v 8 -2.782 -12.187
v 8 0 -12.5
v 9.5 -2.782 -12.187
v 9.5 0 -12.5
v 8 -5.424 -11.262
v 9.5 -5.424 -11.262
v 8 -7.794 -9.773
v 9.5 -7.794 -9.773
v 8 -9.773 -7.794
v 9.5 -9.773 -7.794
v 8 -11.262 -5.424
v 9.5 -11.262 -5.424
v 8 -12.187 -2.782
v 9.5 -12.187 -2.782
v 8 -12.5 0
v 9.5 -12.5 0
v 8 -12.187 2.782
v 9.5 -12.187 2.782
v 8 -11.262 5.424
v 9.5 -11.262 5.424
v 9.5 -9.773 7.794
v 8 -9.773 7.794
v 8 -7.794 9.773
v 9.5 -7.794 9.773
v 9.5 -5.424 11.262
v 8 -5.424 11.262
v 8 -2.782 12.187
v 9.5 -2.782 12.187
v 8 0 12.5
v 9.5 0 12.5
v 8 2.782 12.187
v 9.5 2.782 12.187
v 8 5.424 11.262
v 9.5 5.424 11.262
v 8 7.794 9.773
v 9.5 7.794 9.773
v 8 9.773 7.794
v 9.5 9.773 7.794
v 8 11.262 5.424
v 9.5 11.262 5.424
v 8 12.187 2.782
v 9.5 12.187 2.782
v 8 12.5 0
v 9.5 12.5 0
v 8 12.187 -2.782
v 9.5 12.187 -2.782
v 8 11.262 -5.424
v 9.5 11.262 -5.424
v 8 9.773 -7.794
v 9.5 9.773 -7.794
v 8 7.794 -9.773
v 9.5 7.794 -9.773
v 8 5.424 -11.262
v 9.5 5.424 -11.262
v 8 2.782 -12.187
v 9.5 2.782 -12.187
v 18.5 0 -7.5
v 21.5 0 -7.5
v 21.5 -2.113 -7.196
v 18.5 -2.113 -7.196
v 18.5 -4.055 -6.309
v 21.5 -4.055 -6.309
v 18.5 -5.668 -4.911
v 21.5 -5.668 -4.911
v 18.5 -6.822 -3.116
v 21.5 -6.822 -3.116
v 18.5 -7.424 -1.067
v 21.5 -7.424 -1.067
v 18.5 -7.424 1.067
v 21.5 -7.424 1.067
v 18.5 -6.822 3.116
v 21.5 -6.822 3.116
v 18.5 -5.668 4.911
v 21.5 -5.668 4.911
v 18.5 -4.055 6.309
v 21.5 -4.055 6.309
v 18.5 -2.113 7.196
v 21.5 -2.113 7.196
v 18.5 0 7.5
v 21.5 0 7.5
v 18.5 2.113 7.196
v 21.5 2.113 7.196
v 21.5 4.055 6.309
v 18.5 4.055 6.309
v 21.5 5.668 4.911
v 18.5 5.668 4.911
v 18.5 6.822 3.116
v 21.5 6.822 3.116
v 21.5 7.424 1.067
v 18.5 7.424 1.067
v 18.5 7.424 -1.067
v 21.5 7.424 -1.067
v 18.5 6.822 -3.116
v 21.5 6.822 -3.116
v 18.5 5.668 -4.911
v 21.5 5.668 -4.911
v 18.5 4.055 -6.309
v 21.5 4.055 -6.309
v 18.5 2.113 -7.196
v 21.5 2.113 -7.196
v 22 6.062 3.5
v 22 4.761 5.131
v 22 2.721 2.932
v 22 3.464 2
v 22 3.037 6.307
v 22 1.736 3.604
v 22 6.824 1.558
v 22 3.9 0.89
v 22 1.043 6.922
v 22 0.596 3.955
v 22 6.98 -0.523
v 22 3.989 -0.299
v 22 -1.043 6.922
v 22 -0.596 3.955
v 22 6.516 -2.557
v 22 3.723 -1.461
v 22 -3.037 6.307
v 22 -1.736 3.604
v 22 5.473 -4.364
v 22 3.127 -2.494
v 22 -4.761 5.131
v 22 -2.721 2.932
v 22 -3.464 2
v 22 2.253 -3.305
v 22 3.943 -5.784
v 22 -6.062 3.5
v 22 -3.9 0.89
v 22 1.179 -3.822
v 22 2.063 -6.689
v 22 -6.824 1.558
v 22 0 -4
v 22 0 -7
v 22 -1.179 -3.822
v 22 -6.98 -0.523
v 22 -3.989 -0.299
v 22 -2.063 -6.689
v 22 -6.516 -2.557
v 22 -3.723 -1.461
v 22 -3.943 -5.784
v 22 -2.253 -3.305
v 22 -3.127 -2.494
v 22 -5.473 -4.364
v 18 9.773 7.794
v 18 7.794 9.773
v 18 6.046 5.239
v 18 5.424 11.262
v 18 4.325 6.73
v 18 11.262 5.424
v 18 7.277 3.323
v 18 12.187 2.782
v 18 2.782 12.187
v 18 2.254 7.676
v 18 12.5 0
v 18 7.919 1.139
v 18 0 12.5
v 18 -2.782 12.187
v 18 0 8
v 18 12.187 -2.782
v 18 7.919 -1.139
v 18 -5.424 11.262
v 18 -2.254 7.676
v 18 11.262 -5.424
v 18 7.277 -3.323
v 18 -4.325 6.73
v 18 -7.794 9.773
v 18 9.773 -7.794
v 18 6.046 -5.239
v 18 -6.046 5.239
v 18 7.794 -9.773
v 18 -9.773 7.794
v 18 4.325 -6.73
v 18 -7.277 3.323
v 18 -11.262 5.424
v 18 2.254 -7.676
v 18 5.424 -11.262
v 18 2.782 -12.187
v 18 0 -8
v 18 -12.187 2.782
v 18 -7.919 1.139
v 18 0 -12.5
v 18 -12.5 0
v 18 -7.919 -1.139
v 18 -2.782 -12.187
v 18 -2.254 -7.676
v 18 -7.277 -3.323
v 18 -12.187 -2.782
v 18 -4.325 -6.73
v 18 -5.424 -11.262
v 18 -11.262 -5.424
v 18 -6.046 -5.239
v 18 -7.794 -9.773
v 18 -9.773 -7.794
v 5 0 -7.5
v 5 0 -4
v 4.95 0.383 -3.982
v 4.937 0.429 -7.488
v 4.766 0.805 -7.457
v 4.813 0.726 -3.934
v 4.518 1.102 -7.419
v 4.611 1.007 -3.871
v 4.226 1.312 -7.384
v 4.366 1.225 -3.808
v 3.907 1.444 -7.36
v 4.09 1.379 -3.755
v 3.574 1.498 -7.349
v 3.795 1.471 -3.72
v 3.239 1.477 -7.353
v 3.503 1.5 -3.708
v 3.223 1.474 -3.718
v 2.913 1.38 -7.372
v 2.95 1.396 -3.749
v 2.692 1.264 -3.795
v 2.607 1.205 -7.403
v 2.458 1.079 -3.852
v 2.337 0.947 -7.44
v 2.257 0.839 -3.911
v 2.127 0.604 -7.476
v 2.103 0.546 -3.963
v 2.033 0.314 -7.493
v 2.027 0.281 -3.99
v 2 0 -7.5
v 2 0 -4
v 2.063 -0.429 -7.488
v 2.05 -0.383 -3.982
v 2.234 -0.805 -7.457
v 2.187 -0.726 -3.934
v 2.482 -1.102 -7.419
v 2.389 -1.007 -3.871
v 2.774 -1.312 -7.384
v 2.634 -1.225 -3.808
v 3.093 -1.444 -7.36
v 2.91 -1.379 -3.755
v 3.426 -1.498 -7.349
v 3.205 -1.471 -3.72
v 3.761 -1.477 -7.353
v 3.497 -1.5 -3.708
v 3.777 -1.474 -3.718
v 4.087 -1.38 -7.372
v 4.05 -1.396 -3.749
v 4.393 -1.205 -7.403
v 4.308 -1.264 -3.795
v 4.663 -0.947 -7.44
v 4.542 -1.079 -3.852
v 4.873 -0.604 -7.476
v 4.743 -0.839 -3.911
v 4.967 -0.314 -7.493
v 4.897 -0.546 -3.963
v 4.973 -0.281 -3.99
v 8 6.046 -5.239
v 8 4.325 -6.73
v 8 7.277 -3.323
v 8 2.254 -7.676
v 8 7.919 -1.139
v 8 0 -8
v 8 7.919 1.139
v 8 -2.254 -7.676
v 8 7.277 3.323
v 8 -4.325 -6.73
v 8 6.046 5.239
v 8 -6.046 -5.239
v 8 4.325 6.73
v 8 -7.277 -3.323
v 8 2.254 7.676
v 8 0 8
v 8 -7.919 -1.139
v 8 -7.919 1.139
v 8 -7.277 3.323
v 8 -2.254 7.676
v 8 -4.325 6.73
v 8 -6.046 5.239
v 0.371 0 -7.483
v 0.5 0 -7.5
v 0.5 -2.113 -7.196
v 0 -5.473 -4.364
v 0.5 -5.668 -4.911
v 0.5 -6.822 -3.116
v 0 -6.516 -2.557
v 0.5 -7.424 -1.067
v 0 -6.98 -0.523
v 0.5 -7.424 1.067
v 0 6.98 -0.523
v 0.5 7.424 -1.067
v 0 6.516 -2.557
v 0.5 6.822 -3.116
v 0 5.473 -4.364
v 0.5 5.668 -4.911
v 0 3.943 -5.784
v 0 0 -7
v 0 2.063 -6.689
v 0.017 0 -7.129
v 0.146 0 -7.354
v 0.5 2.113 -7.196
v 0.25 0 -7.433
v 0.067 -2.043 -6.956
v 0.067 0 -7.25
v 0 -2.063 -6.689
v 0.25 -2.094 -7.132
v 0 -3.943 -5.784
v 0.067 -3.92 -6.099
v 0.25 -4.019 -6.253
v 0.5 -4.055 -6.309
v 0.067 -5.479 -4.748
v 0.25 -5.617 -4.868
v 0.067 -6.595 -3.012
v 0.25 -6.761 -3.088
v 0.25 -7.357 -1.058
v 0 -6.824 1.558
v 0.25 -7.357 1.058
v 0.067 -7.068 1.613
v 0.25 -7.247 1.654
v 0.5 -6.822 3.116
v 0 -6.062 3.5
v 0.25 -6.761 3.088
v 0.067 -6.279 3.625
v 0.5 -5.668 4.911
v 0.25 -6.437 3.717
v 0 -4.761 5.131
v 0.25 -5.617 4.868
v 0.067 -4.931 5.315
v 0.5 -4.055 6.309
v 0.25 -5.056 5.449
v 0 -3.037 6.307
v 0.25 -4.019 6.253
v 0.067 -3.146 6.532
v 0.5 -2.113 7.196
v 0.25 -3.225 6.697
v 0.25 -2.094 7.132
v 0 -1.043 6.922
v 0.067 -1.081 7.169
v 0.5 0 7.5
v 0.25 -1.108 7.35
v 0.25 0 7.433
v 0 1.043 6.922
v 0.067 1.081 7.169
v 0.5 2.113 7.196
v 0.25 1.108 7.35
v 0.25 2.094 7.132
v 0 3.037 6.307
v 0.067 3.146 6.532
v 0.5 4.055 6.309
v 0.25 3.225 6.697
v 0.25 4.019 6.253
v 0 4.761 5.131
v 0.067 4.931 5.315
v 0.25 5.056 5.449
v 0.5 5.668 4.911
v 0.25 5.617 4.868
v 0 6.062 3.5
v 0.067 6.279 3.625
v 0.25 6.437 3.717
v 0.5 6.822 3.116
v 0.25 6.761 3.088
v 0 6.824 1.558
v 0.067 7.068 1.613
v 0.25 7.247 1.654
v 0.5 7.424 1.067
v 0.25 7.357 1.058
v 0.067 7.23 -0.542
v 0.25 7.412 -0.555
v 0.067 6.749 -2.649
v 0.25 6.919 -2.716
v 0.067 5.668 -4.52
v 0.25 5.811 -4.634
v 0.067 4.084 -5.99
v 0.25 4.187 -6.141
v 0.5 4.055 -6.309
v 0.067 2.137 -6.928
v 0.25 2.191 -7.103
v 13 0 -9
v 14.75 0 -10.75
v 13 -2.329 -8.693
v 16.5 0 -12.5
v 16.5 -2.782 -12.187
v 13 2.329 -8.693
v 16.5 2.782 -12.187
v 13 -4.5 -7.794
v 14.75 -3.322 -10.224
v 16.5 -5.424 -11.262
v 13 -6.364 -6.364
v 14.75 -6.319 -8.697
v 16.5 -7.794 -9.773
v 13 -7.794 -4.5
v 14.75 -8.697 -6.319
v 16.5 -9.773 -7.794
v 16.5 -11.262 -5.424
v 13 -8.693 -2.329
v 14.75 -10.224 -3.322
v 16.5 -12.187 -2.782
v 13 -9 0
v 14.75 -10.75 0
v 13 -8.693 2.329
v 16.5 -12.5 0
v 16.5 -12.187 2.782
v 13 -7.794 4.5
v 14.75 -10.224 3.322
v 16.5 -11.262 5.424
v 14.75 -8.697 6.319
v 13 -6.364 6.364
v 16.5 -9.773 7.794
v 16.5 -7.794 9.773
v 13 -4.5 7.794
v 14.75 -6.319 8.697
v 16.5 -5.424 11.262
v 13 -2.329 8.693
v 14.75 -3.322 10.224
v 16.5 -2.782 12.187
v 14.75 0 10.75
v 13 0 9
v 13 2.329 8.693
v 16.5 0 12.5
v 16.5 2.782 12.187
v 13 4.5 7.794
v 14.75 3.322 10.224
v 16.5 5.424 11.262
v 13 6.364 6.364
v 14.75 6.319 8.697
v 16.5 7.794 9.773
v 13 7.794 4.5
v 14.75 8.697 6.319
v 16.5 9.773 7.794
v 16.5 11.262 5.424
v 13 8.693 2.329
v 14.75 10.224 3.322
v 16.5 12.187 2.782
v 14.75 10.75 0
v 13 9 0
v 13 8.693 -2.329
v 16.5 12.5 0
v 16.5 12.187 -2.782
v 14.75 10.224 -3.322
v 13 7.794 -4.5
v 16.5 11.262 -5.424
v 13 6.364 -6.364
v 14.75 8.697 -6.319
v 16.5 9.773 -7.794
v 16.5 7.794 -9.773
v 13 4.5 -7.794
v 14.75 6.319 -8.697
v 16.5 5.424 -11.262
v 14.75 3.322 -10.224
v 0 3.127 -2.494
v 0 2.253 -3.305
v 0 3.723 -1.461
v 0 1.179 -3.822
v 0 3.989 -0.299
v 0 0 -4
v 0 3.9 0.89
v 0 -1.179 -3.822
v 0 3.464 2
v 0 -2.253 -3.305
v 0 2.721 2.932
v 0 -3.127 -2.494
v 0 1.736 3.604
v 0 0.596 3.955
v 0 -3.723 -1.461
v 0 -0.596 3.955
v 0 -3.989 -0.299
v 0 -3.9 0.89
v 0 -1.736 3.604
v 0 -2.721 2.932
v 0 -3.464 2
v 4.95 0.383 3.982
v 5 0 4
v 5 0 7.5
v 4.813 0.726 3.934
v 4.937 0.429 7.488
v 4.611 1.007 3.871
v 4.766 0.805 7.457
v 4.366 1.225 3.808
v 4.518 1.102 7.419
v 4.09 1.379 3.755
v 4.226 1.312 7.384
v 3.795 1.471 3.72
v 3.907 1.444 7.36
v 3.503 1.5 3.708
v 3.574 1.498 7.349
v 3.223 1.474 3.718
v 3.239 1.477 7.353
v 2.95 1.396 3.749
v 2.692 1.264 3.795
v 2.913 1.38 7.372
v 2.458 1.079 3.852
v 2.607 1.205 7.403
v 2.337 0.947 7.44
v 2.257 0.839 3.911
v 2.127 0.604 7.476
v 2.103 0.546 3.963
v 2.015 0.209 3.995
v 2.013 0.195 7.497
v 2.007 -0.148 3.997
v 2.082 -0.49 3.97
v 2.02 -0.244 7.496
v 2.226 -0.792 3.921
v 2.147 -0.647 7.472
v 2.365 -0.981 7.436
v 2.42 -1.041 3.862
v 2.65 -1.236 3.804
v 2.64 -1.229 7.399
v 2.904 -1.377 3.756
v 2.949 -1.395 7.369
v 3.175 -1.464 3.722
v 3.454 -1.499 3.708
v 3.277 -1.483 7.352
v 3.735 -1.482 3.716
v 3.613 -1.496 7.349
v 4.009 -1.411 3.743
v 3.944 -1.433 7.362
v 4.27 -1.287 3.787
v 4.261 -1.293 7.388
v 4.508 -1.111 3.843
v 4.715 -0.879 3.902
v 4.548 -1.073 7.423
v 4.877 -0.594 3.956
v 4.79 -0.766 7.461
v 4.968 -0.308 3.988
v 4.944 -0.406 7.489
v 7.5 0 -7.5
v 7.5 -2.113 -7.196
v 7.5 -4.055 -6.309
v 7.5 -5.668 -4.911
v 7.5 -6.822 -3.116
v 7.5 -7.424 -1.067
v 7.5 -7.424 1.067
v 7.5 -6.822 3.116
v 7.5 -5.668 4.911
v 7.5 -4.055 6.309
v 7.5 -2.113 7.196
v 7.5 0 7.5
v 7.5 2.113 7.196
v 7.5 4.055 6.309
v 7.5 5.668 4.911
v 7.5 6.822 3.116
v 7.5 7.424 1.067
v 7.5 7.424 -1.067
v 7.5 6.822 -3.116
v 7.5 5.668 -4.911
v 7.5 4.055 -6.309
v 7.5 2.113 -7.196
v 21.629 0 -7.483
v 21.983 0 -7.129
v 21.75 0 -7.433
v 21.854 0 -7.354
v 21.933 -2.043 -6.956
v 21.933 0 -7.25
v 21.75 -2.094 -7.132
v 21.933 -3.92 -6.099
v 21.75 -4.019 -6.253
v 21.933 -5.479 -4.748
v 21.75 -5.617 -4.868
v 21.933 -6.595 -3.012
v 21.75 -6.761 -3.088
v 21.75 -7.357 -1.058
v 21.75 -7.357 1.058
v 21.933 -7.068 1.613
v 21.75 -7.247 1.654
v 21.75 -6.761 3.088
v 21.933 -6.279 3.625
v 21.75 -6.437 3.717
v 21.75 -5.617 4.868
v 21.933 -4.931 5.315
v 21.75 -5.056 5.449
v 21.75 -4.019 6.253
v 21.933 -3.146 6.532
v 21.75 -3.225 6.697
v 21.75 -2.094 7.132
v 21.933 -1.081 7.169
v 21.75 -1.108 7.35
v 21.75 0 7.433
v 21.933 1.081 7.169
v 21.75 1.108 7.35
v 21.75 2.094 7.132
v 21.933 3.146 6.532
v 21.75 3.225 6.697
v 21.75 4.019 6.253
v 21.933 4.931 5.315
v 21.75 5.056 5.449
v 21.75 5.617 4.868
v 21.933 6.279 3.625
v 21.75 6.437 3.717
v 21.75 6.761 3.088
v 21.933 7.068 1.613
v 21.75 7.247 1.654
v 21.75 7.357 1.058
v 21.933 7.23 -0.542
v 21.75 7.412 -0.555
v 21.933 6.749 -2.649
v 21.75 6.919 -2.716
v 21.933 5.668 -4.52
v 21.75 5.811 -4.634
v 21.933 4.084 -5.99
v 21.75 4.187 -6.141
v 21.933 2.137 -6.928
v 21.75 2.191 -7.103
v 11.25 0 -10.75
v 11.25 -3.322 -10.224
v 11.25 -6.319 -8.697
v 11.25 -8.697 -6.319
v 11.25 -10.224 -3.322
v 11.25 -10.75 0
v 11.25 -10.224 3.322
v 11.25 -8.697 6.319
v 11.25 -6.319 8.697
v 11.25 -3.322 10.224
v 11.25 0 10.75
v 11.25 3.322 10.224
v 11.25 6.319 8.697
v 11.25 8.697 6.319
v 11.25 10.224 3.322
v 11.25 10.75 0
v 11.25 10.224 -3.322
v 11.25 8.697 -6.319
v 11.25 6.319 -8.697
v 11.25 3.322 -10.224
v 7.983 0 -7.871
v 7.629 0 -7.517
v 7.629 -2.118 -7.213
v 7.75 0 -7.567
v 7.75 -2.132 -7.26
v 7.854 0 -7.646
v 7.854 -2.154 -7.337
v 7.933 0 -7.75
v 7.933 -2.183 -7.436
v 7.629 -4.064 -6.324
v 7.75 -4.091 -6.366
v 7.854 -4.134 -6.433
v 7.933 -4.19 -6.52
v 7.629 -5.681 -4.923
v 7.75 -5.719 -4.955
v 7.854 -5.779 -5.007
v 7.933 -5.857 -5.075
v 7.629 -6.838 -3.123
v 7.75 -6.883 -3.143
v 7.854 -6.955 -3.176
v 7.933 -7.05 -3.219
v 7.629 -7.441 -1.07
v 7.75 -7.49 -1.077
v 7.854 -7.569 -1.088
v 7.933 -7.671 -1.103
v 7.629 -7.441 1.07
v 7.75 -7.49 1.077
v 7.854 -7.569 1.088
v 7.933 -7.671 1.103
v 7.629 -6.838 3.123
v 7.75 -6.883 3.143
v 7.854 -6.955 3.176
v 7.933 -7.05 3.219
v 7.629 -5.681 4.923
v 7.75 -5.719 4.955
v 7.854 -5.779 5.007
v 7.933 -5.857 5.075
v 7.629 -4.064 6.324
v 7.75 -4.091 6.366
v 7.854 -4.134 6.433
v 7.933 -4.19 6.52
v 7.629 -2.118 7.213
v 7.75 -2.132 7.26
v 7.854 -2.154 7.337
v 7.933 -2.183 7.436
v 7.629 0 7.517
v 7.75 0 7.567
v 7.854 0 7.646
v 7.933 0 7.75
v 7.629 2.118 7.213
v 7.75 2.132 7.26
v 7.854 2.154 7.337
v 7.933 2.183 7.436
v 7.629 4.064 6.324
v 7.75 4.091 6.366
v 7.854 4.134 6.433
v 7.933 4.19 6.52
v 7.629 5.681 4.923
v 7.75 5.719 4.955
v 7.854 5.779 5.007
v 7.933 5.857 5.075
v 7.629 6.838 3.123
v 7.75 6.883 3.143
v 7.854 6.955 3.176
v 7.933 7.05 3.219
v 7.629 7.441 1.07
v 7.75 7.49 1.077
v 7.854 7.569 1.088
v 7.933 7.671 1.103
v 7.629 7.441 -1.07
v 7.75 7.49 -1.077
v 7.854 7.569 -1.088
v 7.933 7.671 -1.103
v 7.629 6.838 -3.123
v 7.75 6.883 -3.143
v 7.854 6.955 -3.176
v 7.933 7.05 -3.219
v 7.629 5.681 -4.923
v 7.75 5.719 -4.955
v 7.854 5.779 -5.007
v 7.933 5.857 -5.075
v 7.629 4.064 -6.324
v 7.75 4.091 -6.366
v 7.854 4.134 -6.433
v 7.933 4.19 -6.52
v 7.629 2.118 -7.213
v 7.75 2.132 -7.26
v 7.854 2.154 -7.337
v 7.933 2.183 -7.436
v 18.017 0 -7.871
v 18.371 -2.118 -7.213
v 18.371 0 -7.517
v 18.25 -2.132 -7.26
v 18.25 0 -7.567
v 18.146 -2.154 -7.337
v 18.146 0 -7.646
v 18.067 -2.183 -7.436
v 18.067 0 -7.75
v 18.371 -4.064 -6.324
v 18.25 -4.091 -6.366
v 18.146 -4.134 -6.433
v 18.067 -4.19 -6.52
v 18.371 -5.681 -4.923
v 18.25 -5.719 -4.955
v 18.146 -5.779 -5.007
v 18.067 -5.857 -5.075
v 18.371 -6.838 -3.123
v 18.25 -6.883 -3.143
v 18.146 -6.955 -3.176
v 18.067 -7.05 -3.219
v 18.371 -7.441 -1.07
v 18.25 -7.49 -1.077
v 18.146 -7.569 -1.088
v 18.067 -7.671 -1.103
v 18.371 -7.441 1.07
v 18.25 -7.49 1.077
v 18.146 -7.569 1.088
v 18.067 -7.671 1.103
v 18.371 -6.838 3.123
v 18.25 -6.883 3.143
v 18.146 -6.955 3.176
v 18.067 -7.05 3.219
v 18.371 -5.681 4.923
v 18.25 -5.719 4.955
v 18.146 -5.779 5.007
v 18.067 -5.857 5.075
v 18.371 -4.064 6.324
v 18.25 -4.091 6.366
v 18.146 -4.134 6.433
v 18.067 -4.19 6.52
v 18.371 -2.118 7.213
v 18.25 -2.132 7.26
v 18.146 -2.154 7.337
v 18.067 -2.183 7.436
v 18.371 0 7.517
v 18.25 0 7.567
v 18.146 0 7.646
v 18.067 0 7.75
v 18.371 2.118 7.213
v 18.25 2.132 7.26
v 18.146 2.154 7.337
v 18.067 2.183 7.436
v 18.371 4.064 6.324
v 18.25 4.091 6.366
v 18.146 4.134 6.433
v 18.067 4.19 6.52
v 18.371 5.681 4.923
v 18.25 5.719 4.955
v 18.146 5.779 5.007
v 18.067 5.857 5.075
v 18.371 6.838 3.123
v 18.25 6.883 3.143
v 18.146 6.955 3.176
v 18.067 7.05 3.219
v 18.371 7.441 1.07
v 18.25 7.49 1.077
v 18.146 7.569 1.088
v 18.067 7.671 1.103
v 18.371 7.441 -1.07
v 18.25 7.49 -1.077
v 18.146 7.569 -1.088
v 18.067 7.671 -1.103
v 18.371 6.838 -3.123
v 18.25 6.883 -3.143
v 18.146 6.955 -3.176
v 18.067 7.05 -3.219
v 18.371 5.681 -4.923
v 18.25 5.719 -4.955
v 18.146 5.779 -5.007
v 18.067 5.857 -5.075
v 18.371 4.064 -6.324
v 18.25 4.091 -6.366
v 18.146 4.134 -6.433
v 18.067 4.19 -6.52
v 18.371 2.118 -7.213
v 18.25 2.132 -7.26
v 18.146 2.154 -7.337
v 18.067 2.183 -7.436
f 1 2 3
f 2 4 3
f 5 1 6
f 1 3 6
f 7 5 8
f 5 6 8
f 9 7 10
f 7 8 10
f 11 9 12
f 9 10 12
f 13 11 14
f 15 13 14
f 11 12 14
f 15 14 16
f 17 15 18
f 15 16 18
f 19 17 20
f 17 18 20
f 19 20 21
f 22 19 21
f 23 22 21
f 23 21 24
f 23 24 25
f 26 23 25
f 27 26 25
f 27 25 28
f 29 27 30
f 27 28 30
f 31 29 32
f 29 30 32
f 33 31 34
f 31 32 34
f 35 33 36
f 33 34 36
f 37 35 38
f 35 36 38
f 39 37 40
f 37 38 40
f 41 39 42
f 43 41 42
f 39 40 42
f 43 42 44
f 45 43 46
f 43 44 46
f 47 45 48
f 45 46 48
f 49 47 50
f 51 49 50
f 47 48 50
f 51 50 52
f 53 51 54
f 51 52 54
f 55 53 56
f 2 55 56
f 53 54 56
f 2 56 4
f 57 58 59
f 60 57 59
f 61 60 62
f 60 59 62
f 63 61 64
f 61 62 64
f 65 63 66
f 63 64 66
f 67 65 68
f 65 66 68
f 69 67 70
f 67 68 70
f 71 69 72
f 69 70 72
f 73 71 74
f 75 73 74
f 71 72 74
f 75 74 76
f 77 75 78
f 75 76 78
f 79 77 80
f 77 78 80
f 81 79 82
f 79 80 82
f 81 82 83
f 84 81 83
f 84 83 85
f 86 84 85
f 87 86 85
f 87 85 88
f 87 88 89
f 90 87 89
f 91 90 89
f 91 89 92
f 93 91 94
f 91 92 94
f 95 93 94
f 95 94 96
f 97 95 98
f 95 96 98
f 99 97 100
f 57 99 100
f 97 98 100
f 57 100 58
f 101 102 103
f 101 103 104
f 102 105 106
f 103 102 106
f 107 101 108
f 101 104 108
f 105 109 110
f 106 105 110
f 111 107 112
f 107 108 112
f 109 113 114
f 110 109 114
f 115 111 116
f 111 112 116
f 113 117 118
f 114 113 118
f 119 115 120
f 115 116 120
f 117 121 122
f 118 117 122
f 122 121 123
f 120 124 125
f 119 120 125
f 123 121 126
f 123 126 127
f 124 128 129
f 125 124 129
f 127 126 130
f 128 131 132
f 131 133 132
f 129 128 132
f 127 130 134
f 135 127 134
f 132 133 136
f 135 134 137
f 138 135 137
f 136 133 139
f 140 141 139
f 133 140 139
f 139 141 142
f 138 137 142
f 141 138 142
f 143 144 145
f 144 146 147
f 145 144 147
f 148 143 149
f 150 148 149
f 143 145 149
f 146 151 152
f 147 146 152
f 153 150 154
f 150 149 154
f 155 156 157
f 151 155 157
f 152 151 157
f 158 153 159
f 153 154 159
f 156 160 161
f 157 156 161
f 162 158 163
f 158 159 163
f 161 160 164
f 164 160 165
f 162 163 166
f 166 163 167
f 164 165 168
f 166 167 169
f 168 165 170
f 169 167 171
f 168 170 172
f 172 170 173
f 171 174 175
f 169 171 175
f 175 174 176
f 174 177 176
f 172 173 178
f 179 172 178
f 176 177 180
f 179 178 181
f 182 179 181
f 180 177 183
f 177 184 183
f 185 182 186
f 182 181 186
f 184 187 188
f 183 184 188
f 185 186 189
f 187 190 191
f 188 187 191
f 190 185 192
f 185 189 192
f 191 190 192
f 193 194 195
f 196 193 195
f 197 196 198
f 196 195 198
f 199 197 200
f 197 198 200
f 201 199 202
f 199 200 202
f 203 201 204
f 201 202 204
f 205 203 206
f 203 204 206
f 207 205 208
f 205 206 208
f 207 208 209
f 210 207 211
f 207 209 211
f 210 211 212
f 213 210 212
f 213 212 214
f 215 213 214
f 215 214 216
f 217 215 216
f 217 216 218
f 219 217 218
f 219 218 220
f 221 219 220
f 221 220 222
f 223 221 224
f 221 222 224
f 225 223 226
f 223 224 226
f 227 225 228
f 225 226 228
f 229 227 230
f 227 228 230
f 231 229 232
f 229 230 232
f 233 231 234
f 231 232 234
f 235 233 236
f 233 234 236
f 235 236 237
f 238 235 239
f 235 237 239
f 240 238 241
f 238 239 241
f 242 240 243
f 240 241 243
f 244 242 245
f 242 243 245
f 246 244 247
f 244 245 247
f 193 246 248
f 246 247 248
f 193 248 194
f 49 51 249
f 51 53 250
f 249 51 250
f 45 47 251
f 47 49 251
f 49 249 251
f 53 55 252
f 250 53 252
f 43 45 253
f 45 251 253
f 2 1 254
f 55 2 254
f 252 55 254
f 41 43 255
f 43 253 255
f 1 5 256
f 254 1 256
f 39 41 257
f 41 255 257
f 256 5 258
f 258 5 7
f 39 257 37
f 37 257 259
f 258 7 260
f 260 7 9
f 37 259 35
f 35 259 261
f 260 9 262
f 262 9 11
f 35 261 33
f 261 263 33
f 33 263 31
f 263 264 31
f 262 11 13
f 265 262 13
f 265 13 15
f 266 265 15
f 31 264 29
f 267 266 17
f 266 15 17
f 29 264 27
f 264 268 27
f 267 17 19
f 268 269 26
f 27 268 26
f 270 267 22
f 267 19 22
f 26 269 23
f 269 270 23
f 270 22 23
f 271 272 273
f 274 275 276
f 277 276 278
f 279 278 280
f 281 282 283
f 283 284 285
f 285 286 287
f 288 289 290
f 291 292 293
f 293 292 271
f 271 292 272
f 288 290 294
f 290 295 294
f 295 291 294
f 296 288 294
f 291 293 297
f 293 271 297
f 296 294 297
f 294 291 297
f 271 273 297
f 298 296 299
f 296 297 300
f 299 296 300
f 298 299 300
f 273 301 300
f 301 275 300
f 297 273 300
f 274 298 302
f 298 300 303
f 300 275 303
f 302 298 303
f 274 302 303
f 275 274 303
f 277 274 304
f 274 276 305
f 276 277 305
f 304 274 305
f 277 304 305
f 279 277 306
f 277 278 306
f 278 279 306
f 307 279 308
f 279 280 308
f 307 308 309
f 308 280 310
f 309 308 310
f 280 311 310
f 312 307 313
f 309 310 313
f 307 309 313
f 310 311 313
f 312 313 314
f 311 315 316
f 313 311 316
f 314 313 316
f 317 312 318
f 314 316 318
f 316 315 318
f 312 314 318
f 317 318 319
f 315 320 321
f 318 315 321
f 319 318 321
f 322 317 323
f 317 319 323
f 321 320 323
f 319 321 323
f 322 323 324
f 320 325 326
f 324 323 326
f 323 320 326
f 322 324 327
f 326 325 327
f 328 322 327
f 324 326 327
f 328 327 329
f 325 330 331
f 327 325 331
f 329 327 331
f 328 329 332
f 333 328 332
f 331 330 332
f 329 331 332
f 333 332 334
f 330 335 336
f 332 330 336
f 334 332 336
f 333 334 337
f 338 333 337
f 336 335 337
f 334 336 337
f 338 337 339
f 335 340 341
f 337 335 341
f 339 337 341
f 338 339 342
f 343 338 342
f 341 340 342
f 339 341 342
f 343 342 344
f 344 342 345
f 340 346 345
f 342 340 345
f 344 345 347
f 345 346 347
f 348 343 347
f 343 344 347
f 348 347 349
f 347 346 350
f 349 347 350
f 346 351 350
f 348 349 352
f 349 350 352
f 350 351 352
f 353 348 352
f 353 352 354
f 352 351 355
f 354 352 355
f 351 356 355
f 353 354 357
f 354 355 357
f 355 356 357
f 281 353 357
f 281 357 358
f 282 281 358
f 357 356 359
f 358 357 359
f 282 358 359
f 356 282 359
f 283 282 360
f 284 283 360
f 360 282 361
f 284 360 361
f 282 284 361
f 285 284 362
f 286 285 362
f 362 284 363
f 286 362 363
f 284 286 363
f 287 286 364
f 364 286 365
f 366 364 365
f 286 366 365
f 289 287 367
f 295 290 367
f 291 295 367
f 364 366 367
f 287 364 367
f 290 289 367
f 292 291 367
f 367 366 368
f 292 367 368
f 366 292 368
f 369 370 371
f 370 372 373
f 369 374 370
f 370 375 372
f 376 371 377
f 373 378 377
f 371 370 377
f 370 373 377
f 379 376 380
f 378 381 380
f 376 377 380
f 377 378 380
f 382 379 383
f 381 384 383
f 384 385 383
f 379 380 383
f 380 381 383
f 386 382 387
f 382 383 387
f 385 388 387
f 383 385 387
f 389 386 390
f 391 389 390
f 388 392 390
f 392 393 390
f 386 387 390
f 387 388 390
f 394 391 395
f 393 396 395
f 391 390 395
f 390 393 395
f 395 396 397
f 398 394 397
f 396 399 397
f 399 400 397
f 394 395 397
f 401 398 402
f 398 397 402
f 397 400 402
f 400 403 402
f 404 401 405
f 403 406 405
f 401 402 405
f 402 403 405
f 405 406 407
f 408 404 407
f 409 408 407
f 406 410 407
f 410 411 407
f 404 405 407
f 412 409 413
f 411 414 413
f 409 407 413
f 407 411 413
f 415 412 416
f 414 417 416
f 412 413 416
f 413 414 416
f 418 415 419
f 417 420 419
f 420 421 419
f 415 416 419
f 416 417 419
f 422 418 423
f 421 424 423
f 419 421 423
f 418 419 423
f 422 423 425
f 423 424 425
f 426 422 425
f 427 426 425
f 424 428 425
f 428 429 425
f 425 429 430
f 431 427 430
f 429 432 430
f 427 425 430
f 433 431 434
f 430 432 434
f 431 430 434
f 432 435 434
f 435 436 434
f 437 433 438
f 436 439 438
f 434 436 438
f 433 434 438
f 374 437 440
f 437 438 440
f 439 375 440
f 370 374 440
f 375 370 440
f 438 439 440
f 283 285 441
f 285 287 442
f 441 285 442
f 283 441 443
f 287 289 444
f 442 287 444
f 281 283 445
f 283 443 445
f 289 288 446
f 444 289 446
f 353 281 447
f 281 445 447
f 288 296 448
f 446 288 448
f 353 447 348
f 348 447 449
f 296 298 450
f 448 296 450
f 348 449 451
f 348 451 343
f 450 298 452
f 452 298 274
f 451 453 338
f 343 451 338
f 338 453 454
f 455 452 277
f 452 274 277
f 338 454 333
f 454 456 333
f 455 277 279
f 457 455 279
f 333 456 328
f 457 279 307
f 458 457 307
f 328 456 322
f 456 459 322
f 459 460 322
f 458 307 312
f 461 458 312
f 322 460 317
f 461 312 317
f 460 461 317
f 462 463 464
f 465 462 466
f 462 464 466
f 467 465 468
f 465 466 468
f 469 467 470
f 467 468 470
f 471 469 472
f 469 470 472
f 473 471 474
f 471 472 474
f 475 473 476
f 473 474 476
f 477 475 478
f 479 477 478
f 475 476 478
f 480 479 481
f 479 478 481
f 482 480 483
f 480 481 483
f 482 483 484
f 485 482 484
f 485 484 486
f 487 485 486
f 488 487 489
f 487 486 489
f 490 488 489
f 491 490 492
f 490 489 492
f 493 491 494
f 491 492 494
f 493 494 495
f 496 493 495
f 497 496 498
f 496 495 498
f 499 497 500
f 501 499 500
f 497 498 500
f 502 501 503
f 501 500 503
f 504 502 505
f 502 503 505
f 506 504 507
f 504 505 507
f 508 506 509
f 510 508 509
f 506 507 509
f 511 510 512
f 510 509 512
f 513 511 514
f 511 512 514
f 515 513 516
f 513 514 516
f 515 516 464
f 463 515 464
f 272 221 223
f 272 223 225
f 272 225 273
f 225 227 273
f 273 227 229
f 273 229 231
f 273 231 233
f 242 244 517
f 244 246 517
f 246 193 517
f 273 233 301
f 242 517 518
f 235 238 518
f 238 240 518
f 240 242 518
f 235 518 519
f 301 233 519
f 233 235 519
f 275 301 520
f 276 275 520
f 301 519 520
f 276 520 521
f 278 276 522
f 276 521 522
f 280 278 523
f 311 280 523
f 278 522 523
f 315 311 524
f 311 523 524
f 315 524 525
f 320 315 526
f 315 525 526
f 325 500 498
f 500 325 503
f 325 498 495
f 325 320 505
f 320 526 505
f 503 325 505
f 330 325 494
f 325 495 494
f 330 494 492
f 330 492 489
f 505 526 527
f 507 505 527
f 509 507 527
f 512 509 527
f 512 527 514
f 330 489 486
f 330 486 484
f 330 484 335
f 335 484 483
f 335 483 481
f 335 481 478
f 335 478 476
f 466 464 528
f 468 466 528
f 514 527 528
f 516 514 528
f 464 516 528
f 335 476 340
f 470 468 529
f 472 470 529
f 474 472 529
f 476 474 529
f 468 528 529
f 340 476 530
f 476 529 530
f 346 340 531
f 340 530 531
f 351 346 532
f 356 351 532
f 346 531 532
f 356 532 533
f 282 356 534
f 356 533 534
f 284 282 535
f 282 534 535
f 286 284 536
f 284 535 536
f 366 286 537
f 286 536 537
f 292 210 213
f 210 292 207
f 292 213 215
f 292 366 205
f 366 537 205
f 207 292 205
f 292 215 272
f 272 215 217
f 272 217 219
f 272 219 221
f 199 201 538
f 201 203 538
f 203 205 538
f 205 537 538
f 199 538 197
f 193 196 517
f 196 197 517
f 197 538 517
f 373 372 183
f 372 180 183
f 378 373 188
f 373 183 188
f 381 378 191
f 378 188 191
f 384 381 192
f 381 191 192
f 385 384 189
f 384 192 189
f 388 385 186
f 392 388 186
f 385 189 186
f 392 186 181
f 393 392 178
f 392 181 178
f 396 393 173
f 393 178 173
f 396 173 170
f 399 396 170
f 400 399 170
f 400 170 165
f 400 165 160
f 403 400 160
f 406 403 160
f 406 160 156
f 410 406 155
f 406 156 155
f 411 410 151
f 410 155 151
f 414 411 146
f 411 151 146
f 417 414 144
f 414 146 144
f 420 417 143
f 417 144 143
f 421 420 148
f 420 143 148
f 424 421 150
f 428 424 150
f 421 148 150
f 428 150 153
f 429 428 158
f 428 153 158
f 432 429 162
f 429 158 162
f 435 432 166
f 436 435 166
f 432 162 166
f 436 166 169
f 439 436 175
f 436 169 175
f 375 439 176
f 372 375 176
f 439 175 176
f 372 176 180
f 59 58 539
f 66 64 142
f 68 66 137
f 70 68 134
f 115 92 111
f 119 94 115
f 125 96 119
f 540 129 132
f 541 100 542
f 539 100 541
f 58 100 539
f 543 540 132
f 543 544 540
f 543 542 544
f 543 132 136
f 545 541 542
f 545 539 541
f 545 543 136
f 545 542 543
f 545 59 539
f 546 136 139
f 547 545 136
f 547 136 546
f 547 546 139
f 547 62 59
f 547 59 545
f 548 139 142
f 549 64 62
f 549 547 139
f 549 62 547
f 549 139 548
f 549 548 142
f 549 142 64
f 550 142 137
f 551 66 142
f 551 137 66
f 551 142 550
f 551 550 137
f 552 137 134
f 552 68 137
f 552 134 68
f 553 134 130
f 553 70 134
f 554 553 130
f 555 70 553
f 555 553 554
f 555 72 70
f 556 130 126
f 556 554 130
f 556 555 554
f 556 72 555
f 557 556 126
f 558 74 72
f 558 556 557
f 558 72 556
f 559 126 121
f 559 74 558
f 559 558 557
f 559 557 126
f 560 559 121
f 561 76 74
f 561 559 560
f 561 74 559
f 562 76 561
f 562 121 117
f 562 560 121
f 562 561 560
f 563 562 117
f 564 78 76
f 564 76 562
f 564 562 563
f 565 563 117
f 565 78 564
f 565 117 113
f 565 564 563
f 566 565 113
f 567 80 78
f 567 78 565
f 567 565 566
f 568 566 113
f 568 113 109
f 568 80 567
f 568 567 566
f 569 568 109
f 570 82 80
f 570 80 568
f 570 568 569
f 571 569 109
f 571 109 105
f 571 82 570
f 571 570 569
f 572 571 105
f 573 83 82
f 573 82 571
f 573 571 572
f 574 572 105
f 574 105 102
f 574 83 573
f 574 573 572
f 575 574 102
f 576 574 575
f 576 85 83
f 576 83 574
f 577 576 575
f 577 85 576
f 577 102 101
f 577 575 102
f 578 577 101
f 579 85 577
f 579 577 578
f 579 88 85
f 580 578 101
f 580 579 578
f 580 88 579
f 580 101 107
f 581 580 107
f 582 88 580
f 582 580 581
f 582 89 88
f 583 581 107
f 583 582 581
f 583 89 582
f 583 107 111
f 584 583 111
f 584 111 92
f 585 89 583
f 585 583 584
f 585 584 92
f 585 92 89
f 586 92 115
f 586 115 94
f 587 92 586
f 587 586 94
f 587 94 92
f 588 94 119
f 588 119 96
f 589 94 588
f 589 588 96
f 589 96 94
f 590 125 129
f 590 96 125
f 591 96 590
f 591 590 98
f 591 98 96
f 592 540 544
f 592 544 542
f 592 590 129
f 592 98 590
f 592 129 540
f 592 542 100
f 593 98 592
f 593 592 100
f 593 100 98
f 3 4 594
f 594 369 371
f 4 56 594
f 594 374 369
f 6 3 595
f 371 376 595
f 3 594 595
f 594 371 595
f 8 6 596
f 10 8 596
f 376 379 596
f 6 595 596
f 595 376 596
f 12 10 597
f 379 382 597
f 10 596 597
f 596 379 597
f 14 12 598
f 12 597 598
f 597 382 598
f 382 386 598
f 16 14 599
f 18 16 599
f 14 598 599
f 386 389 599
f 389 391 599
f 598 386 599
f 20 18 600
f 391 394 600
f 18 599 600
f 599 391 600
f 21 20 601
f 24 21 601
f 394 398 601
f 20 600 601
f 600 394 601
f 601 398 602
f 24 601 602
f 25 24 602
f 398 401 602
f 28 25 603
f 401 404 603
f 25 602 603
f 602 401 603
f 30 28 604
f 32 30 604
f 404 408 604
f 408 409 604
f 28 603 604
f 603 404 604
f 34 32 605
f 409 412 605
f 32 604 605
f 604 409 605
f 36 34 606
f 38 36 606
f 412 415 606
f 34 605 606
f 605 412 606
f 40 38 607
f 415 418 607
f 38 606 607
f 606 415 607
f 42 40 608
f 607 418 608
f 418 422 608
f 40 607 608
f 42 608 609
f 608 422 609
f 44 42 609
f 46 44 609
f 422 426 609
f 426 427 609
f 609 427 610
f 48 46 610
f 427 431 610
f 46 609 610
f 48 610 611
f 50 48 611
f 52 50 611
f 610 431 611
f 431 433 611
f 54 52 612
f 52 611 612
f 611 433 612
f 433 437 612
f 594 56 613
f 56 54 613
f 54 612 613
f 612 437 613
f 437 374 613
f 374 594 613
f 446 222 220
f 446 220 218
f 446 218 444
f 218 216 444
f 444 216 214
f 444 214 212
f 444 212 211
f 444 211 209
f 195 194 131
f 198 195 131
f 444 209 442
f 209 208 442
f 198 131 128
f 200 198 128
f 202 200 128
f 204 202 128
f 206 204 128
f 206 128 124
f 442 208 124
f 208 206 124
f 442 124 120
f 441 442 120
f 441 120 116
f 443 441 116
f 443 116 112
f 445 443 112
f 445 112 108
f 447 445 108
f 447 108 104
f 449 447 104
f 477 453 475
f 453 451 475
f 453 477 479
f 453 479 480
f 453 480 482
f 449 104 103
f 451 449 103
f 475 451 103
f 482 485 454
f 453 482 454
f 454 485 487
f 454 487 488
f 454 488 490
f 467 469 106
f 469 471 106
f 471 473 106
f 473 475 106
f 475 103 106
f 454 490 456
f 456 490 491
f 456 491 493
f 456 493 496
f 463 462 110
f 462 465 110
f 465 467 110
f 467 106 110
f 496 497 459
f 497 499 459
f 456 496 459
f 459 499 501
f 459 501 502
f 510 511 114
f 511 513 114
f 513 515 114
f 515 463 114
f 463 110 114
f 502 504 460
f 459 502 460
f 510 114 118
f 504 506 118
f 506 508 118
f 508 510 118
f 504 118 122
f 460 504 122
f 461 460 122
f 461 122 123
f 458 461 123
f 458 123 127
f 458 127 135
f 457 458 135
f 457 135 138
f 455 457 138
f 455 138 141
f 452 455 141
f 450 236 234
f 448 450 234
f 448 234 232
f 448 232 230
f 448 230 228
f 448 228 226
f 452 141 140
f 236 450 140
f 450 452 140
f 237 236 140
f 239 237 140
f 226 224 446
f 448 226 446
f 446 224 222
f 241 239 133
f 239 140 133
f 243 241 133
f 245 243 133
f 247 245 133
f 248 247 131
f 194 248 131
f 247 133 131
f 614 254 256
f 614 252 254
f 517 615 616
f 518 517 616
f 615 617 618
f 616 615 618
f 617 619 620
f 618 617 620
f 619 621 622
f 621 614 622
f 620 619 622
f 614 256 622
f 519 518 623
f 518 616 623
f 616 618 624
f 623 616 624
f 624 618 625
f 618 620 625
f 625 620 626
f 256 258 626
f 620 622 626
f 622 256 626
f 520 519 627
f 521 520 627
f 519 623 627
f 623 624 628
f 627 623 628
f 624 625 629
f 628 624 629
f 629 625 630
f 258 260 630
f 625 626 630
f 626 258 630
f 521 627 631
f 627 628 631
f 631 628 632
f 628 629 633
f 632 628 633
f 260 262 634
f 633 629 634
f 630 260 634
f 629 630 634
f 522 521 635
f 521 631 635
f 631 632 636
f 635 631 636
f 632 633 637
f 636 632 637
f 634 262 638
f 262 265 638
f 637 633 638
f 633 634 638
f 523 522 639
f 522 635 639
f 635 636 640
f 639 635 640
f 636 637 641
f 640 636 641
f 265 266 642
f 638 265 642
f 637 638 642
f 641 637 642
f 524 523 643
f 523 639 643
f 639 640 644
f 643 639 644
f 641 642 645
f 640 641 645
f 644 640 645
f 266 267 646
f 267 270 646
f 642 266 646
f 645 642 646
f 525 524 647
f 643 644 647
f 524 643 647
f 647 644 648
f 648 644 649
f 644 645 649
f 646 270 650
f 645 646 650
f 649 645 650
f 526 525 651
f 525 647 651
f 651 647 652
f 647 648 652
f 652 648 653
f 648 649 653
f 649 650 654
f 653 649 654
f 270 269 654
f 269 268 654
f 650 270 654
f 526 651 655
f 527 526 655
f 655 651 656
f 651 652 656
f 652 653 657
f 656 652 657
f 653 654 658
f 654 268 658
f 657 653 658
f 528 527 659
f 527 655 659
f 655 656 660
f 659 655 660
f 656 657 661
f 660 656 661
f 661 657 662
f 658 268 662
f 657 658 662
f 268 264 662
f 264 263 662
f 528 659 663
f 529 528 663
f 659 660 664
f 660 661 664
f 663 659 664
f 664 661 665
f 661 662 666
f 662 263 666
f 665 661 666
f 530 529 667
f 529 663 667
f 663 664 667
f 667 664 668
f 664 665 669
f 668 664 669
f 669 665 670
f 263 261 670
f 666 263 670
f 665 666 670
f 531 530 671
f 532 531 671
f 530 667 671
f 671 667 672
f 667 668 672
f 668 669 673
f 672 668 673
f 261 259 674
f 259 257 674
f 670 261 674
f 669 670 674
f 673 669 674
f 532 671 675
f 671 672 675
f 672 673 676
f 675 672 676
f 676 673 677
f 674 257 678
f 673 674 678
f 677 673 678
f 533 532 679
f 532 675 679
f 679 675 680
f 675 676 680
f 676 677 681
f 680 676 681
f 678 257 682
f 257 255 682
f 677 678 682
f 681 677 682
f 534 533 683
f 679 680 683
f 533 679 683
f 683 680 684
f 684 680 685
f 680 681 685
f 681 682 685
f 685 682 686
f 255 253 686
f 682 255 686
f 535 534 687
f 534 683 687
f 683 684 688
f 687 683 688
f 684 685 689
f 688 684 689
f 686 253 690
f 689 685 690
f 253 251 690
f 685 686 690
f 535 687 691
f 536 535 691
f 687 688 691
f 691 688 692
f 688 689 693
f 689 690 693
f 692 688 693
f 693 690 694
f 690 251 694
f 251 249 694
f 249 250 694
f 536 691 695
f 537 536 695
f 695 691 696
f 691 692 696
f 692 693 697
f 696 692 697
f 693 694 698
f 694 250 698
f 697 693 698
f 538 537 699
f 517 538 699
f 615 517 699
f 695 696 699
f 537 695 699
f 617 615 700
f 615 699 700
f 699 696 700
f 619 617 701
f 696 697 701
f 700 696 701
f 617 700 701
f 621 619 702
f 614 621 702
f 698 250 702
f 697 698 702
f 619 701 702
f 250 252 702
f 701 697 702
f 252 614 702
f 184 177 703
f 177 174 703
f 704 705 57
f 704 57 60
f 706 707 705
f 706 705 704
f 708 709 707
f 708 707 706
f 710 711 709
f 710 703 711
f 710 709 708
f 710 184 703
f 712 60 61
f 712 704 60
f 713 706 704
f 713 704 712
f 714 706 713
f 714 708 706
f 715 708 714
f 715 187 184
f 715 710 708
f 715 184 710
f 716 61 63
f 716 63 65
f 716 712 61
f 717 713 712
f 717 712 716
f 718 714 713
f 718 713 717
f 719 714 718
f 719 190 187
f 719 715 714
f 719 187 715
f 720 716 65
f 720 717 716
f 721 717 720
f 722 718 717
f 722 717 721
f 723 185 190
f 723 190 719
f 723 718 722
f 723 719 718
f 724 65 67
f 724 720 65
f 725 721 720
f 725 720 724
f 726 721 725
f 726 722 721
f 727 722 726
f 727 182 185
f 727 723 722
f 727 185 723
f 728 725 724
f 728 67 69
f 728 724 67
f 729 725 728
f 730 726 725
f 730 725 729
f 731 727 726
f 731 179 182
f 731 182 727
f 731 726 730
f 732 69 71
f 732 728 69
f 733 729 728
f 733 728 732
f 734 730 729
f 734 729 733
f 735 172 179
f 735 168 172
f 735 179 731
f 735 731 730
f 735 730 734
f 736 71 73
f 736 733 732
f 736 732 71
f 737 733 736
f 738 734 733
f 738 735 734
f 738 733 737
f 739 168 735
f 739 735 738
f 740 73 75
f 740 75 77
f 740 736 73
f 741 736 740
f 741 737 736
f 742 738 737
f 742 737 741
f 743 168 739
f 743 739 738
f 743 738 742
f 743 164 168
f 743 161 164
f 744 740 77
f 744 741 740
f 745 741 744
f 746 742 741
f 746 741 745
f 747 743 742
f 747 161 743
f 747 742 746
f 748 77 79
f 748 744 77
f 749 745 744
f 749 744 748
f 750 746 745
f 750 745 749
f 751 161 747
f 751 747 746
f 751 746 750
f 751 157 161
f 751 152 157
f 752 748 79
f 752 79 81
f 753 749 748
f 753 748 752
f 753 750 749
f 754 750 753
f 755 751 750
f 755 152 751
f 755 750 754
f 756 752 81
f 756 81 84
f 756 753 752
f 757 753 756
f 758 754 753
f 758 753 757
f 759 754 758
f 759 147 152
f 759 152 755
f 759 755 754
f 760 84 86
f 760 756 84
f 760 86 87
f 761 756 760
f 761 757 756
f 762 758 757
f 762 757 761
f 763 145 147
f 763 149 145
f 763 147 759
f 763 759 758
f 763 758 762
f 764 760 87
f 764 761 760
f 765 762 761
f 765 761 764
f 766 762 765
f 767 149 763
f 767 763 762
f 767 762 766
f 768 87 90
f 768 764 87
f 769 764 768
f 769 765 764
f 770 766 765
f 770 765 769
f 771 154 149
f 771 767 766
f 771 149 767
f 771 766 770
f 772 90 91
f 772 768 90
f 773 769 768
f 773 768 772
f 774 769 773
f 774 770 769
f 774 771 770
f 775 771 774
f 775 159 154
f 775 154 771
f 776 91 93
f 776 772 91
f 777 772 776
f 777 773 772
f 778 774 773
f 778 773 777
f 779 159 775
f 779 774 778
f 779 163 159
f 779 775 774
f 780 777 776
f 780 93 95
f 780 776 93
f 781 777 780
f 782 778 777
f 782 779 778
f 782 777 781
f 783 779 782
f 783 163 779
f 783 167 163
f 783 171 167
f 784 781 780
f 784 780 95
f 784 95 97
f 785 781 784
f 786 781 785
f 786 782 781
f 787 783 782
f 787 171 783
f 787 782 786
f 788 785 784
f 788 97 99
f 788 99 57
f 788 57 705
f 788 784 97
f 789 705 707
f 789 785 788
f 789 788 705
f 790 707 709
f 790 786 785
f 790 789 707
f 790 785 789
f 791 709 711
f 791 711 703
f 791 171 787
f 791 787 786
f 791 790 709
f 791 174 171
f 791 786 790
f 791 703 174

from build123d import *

# Parameters (mm, degrees)
SKETCH2_R          = 4
CUT_EXTRUDE1_DEPTH = 29.222331583
SKETCH3_R          = 1.5
CUT_EXTRUDE2_DEPTH = 20
FILLET1_R          = 0.5


with BuildPart() as part:
    # Sketch1 → Revolve1 (revolve)
    with BuildSketch(Plane.XY, mode=Mode.PRIVATE) as revolve1_sk:
        Polygon((0, 0), (0, 7.5), (8, 7.5), (8, 12.5), (9.5, 12.5), (13, 9), (16.5, 12.5), (18, 12.5), (18, 7.5), (22, 7.5), (22, 0), align=None)
    revolve(revolve1_sk.sketch.rotate(Axis((22, 0, 0), (-1, 0, 0)), 90), axis=Axis((22, 0, 0), (-1, 0, 0)))

    # Sketch2 → Cut-Extrude1 (cut, through all)
    with BuildSketch(Plane(origin=(22, 0, 0), x_dir=(0, 0, -1), z_dir=(1, 0, 0))):
        Circle(SKETCH2_R)
    extrude(amount=-CUT_EXTRUDE1_DEPTH, mode=Mode.SUBTRACT)

    # Sketch3 → Cut-Extrude2 (cut, symmetric)
    with BuildSketch(Plane.XY):
        with Locations((3.5, 0)):
            Circle(SKETCH3_R)
    extrude(amount=CUT_EXTRUDE2_DEPTH, both=True, mode=Mode.SUBTRACT)

    # Fillet1
    fillet1_edges = [part.edges().sort_by_distance(p)[0] for p in [
        (8, 0, 7.5),
        (0, 0, 7.5),
        (22, 0, 7.5),
        (18, 0, 7.5),
    ]]
    fillet(fillet1_edges, radius=FILLET1_R)


solid = part.part
